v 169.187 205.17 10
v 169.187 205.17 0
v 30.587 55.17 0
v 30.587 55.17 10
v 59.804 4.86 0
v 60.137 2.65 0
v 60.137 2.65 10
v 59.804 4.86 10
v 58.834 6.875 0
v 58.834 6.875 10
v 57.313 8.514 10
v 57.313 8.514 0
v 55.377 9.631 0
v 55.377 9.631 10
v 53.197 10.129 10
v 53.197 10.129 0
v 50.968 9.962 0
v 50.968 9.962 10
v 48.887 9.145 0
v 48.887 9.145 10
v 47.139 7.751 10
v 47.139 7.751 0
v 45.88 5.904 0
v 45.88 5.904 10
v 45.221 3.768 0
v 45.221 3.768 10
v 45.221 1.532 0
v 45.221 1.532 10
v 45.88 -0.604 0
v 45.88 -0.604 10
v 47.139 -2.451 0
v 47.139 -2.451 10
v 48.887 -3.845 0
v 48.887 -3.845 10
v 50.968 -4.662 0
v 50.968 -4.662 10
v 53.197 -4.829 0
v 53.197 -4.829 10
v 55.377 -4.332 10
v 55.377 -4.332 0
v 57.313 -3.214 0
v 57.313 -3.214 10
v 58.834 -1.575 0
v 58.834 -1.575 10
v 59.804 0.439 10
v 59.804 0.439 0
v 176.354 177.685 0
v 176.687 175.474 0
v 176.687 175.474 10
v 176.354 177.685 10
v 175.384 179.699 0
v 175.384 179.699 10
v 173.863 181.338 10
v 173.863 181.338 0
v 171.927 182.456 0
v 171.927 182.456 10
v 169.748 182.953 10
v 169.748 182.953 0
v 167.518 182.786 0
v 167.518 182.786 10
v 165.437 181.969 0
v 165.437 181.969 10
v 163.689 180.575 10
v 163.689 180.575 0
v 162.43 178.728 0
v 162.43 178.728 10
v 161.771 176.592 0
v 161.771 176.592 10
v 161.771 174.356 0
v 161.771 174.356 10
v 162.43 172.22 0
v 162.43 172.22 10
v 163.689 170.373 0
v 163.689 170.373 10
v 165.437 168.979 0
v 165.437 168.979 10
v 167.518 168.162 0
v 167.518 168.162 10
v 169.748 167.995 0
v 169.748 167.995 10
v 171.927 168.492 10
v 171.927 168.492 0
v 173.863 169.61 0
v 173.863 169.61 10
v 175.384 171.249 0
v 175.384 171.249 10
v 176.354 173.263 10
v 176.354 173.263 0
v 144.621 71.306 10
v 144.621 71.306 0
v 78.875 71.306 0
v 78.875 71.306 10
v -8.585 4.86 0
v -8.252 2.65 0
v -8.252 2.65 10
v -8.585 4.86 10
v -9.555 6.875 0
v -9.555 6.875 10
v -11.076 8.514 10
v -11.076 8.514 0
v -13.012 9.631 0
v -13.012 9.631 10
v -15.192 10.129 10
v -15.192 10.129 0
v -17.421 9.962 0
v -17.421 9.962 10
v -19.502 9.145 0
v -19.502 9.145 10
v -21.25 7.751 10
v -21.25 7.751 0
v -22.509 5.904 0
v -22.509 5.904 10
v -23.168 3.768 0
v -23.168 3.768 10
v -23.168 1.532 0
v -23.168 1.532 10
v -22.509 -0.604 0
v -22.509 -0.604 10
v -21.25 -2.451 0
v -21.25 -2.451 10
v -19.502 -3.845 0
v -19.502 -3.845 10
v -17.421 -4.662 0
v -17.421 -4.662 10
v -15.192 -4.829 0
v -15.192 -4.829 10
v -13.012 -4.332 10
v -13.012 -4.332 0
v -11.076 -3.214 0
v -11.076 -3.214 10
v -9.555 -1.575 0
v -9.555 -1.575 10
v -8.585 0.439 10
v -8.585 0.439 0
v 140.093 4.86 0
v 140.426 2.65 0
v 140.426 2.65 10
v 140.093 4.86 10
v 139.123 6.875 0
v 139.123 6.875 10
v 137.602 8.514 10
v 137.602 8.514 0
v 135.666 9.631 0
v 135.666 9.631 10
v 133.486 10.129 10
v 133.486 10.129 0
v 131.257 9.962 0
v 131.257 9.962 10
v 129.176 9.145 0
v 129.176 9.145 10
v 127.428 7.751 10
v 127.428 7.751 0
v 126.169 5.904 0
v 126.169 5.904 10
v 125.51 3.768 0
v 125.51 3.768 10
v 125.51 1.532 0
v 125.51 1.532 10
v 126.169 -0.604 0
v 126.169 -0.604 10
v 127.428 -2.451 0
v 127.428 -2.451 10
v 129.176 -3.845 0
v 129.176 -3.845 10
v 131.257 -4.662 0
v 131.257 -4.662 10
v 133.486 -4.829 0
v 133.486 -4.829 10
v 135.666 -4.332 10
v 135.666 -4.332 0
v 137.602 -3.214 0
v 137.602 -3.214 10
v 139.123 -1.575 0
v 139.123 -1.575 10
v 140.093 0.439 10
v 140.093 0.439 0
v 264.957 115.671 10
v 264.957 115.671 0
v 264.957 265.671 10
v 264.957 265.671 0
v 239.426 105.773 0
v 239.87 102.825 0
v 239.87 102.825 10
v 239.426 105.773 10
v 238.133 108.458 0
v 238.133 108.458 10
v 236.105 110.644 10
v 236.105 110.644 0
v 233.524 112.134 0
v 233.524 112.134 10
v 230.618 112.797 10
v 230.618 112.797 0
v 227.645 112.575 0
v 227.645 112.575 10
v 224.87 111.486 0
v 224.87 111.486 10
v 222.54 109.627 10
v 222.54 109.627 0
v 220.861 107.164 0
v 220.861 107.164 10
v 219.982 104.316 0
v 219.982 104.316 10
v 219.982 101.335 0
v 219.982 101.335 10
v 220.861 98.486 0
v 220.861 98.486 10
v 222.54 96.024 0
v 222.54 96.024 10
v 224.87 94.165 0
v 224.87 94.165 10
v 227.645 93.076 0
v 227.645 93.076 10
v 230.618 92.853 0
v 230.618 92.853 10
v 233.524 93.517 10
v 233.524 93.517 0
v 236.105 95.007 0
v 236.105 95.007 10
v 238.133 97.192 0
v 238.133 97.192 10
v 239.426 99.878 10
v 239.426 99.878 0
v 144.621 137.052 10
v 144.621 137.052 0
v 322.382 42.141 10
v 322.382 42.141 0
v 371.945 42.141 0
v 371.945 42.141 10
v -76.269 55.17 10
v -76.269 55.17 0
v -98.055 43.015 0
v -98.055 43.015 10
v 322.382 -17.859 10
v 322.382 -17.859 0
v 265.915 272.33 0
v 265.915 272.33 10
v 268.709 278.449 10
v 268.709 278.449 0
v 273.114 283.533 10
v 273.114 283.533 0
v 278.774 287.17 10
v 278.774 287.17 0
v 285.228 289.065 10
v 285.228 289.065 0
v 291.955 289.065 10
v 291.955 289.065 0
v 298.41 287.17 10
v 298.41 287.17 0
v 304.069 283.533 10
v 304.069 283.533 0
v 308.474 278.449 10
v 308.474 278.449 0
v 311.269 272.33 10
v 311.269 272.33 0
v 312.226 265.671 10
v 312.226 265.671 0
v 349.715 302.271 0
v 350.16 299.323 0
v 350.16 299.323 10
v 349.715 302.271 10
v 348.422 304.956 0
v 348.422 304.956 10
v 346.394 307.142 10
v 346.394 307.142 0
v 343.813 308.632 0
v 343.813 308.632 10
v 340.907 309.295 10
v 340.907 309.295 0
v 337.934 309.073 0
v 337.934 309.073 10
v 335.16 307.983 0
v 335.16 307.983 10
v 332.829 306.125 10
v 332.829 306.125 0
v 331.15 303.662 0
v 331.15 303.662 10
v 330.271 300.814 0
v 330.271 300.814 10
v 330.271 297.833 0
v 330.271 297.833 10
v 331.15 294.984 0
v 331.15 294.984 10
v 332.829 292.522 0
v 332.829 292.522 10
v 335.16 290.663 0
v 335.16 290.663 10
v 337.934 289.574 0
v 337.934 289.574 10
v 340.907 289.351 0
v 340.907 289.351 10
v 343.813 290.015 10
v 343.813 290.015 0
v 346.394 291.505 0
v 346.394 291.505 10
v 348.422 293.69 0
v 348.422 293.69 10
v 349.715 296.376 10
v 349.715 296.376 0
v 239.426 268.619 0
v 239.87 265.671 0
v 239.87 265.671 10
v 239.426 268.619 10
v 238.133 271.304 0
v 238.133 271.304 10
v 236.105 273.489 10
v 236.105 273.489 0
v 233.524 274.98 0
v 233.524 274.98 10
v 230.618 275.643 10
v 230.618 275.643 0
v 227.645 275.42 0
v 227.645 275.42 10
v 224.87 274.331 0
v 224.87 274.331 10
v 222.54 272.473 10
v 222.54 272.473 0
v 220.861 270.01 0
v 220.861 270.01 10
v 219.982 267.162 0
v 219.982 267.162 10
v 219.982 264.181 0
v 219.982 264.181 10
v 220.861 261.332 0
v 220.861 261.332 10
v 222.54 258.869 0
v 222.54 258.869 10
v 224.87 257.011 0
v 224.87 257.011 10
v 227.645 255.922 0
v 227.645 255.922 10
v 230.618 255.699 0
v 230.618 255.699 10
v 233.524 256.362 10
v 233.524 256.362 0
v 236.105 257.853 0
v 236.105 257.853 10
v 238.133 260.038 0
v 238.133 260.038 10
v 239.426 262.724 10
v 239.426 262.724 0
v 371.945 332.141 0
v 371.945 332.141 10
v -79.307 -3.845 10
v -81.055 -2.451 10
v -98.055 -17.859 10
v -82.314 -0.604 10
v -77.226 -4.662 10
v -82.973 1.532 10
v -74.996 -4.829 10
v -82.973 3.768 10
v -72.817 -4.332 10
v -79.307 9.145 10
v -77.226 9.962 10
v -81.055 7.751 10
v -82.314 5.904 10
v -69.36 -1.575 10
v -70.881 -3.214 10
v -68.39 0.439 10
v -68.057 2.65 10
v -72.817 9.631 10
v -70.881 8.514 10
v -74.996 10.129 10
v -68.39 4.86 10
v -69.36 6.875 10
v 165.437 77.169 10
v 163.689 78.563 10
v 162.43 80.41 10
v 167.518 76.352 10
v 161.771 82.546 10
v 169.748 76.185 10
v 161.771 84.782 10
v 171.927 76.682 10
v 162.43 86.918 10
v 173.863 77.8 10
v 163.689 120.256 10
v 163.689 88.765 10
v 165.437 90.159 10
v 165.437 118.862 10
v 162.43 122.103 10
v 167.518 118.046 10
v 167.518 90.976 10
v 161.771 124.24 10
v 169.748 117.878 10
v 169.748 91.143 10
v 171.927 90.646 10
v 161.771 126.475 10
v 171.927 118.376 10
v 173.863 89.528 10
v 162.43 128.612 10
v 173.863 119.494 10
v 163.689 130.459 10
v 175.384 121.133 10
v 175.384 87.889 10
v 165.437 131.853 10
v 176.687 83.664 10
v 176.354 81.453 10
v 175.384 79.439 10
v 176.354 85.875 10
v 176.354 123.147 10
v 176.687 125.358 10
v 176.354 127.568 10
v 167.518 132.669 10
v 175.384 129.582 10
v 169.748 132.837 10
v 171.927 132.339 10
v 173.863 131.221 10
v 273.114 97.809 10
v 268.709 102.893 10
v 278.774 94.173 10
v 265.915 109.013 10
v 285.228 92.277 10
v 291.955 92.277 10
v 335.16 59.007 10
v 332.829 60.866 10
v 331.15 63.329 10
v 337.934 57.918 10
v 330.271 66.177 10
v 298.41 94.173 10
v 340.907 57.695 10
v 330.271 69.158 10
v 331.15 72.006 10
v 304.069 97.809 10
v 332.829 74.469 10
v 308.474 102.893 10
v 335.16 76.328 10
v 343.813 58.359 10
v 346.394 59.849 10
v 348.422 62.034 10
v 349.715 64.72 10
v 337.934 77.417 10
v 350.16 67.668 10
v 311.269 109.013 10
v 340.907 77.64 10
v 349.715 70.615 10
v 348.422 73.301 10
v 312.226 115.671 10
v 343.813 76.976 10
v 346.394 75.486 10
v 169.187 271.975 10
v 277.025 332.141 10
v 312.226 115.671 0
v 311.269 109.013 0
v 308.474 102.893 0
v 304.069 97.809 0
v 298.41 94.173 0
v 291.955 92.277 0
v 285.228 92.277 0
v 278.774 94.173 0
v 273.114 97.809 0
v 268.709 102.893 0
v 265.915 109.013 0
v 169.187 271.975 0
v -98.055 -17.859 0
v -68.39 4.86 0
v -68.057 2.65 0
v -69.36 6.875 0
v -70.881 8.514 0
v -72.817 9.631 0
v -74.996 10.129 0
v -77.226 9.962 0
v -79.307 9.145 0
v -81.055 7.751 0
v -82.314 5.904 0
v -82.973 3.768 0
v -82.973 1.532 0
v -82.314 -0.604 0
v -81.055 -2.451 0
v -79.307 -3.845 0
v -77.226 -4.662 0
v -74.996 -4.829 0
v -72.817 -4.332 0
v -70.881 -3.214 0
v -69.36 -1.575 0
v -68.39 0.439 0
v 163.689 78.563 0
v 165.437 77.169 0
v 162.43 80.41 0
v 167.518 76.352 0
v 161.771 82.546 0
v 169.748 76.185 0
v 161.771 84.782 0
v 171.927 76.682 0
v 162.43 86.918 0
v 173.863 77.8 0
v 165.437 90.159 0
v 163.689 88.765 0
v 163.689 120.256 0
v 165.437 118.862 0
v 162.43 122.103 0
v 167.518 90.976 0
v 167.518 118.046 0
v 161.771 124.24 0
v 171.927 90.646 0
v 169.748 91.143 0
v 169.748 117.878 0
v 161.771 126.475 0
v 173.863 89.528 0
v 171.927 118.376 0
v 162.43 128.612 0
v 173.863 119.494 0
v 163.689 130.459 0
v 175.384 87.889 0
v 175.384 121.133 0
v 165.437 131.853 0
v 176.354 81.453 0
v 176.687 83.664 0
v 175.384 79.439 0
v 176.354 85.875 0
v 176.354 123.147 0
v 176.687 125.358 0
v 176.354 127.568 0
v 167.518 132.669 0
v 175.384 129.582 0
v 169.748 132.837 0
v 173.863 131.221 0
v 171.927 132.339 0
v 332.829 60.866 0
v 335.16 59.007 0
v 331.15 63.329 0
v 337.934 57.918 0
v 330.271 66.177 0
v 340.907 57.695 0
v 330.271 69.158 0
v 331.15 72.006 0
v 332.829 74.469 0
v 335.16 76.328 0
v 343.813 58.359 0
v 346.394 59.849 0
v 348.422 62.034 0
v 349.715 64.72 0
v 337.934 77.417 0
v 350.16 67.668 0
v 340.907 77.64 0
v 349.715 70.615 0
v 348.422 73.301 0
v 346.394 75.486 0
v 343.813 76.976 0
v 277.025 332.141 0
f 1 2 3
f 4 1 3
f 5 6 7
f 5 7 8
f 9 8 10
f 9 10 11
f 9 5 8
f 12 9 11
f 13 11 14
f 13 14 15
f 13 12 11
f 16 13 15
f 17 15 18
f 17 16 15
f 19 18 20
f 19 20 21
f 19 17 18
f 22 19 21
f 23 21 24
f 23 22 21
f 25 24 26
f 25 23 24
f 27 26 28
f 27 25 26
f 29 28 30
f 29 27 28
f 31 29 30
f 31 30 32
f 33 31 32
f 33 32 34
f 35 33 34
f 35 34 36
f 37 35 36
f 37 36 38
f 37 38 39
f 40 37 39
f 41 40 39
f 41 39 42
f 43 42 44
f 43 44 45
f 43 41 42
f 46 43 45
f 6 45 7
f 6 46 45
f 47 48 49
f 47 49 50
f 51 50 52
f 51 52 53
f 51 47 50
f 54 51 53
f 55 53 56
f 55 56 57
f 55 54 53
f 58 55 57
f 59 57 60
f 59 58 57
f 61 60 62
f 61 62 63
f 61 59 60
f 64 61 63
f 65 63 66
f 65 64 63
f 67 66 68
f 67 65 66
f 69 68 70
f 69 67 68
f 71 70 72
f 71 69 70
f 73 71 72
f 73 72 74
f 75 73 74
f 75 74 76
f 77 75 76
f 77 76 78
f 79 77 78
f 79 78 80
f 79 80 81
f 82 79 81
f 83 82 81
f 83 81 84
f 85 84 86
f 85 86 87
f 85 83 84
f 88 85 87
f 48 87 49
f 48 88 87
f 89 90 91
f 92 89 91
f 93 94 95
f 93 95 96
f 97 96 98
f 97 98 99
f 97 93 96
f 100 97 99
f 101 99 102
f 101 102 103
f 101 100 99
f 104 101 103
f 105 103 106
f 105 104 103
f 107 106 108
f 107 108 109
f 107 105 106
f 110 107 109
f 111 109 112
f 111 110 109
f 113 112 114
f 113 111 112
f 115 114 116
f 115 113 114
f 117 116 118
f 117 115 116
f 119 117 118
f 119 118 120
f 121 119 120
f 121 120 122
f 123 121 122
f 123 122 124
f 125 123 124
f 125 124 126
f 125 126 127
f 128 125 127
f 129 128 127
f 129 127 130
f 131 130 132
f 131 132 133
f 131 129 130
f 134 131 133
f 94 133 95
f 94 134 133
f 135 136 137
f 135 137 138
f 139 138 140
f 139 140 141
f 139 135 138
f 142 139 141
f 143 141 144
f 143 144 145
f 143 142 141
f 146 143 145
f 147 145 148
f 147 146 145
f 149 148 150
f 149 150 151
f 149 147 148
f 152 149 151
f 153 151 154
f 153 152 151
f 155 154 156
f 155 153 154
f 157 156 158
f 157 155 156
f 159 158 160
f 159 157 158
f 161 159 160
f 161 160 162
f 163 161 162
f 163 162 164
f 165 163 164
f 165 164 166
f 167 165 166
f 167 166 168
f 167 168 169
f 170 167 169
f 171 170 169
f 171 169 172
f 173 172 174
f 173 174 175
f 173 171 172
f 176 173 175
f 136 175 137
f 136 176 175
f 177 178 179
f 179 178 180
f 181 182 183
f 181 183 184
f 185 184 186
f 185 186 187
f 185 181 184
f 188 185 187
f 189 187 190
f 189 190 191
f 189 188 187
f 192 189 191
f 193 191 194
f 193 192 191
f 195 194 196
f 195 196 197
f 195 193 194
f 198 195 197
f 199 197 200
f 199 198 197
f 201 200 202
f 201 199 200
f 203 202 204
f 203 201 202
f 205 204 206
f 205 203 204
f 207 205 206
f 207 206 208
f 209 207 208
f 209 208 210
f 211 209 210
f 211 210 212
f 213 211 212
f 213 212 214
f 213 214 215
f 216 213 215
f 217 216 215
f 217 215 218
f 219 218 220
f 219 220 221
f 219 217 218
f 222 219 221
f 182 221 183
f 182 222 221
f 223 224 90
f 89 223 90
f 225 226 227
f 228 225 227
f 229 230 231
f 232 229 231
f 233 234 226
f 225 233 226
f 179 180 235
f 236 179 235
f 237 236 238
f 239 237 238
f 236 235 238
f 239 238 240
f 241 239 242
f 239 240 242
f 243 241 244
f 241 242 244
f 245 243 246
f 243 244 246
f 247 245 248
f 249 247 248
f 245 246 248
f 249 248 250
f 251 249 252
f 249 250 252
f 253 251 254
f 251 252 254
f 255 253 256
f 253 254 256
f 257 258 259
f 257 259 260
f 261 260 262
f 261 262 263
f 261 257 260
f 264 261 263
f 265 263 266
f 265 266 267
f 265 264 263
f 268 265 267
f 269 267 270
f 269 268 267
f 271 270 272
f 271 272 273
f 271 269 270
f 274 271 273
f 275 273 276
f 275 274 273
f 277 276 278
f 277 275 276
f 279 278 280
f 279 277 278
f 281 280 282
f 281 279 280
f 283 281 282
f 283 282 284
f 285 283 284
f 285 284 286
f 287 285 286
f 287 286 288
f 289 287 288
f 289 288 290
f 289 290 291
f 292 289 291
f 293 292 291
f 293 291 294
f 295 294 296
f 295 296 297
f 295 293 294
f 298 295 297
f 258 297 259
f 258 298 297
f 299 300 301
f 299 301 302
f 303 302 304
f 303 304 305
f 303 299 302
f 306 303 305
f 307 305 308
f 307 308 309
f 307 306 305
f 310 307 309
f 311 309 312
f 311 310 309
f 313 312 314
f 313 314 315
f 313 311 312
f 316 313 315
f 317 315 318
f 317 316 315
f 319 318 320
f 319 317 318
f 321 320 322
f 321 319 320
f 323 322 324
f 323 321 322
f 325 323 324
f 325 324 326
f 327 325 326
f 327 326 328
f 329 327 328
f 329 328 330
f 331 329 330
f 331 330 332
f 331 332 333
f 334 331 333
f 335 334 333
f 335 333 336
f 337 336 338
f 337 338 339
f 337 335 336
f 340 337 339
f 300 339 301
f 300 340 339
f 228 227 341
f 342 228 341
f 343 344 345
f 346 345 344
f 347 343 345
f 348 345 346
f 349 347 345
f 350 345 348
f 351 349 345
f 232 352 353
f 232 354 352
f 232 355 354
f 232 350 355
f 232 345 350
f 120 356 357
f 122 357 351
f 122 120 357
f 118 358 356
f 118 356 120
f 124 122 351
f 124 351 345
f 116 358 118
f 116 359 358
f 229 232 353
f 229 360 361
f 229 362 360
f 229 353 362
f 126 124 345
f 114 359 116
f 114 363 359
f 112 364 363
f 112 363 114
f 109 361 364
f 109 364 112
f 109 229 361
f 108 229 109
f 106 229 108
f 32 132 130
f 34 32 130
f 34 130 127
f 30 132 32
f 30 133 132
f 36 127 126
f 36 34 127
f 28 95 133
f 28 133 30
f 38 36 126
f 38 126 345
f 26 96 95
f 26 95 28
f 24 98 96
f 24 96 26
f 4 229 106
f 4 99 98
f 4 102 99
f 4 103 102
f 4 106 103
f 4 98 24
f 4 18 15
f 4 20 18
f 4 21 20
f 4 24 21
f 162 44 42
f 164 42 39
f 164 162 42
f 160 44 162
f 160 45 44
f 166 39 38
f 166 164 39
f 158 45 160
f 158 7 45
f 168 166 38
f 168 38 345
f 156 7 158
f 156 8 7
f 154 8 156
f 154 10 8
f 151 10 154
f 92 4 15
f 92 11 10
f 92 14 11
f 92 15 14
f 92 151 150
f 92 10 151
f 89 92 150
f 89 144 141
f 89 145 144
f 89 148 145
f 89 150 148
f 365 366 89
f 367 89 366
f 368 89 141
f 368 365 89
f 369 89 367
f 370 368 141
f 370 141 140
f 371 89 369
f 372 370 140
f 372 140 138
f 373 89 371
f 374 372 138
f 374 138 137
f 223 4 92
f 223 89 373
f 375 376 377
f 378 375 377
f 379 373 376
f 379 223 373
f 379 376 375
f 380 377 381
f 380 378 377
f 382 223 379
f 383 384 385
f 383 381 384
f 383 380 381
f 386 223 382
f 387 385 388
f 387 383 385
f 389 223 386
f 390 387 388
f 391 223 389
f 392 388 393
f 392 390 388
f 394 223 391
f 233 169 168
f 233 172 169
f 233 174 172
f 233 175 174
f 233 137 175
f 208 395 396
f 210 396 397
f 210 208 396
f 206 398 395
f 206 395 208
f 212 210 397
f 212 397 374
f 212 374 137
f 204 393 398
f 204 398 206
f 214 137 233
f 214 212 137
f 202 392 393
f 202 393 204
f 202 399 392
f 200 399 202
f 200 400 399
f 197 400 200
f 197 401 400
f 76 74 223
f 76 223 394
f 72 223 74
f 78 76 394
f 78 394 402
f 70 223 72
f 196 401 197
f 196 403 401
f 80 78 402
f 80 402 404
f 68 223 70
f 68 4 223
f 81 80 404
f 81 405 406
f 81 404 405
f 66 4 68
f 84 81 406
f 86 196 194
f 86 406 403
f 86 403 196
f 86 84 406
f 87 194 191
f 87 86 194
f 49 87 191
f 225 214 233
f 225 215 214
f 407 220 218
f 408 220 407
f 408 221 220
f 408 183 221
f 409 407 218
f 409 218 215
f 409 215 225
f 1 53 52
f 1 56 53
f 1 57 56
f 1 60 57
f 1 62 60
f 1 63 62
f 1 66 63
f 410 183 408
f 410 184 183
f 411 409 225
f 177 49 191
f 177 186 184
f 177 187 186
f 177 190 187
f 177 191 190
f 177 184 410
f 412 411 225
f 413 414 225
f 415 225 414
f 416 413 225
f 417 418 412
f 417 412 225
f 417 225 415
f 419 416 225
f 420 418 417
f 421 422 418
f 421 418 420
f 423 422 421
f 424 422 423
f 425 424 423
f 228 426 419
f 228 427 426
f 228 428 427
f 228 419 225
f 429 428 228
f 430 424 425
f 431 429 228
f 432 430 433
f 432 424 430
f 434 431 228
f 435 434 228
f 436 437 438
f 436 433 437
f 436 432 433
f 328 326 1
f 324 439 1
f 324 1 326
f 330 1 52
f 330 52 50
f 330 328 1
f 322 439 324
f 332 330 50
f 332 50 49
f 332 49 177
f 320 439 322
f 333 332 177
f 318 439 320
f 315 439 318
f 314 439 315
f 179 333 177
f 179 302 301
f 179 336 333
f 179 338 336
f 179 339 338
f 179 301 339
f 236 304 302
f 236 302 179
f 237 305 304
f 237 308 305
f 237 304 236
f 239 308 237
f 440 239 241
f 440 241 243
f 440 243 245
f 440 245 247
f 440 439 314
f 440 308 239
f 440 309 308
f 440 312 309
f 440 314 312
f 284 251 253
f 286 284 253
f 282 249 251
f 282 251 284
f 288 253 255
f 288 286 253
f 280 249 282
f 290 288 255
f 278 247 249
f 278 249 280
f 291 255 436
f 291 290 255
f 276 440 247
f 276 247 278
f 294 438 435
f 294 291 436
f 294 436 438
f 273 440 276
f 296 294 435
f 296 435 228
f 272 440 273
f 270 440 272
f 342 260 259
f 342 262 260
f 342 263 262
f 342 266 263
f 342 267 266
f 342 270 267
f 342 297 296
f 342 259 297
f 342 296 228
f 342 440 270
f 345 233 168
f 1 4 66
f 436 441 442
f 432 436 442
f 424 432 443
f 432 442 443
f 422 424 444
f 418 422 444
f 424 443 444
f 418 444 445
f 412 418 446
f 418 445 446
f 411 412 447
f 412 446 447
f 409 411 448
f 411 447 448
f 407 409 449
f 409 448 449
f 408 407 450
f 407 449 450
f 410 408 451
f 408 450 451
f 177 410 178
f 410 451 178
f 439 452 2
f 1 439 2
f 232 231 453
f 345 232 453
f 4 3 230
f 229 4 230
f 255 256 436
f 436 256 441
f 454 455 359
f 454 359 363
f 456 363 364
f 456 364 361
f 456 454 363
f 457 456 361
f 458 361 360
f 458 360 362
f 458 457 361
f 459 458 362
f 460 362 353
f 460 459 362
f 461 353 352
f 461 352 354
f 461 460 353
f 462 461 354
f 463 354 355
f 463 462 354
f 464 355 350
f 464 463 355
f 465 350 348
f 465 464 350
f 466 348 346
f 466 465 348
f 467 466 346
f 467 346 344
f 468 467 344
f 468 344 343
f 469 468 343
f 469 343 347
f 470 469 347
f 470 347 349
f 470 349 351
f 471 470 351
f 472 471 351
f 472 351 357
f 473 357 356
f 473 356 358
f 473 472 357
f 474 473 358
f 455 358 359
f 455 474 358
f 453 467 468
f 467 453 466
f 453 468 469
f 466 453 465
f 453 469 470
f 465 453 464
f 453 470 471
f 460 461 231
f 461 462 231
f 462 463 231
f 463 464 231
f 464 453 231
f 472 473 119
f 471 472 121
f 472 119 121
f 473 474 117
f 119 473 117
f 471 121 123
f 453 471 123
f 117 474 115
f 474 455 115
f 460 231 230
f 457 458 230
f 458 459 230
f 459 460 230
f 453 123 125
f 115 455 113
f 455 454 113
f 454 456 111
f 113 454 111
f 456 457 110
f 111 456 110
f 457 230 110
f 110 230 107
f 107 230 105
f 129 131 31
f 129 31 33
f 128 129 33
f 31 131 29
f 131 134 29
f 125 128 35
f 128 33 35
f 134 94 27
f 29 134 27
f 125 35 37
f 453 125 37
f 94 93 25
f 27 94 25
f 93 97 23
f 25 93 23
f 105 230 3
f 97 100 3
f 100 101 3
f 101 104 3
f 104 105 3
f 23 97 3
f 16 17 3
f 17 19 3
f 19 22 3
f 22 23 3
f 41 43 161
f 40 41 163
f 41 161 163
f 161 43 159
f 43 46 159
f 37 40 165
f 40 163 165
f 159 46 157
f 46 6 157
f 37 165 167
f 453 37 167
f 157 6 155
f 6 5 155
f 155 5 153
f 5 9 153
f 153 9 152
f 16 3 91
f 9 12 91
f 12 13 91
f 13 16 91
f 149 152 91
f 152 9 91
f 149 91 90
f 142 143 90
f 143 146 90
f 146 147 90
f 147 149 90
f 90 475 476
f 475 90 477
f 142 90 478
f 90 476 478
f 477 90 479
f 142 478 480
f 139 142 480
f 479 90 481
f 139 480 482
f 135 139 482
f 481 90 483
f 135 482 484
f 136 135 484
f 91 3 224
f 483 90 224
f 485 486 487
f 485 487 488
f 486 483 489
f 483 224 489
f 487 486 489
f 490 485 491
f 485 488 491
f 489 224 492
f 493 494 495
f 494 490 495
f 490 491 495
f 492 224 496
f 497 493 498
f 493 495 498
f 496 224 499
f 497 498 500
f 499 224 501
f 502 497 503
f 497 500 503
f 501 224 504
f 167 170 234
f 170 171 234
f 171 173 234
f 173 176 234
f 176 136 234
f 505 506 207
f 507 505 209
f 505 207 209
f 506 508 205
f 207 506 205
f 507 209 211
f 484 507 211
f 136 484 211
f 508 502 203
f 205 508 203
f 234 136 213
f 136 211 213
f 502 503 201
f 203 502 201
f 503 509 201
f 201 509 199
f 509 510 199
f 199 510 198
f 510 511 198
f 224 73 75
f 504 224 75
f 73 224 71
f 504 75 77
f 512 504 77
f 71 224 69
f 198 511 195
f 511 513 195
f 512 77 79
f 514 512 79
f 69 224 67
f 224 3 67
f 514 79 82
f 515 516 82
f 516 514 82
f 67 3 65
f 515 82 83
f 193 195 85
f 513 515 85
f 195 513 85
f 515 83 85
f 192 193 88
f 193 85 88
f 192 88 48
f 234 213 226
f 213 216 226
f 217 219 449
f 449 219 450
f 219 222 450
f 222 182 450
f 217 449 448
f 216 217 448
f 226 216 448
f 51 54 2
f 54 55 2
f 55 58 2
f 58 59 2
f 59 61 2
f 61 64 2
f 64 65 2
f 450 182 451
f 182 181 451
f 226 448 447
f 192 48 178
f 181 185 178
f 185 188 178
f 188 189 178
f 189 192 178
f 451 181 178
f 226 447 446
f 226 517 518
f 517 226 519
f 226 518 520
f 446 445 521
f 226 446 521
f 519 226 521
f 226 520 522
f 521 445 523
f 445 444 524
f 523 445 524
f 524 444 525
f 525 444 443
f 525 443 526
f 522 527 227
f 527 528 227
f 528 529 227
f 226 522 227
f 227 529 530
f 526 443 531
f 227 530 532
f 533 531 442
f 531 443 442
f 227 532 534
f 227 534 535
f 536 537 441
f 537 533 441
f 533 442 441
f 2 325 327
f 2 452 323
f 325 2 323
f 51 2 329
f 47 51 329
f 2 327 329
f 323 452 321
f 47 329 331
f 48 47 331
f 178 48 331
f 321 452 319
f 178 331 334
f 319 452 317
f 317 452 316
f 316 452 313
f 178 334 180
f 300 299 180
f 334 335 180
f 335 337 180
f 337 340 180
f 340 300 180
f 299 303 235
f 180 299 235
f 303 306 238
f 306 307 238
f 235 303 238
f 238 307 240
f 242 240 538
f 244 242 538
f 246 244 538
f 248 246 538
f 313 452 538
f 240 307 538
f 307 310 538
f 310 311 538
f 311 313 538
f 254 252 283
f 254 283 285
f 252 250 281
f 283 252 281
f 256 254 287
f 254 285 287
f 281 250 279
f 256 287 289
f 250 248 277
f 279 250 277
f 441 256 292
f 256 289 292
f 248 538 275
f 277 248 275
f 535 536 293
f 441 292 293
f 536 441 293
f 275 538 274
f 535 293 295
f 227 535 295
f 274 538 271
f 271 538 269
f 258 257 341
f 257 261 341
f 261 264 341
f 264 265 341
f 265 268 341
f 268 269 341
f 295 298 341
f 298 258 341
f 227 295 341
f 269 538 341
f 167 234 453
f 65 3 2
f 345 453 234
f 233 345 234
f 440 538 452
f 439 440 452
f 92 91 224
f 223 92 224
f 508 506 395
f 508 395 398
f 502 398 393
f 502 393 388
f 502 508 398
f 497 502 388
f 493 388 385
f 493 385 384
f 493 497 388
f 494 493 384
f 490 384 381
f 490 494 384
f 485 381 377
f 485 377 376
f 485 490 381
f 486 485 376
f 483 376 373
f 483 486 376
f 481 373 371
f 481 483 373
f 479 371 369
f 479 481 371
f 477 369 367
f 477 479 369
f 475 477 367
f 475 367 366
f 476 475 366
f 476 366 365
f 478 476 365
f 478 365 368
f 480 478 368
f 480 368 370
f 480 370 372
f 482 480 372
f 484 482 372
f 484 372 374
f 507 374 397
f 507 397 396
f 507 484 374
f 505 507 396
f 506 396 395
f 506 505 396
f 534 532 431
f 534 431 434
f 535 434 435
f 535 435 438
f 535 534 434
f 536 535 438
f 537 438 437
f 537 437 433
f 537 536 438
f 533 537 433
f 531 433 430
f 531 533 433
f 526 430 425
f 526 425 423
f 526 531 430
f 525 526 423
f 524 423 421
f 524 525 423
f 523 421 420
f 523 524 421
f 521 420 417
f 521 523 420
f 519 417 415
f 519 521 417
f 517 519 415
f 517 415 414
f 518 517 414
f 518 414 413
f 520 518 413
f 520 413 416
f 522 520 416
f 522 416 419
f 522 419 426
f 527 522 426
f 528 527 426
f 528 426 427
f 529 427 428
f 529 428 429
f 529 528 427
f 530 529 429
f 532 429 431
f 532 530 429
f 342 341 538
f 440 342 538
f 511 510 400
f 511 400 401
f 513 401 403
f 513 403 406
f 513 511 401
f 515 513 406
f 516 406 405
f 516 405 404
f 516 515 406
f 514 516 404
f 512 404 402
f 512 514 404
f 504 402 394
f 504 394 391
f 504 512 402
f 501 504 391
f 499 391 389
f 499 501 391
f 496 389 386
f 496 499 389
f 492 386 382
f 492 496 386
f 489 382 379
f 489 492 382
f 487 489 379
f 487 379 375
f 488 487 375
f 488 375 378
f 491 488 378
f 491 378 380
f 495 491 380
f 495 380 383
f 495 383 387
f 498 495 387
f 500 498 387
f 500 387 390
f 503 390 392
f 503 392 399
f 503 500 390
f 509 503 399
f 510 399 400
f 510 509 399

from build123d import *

# Parameters (mm, degrees)
SKETCH1_R           = 7.5
SKETCH1_R_2         = 10
BOSS_EXTRUDE1_DEPTH = 10


with BuildPart() as part:
    # Sketch1 → Boss-Extrude1 (new body)
    with BuildSketch(Plane.XY):
        Polygon((-98.05511991, -17.859318996), (322.382476836, -17.859318996), (322.382476836, 42.140681004), (371.94488009, 42.140681004), (371.94488009, 332.140681004), (277.025034275, 332.140681004), (169.187054595, 271.975052979), (169.187054595, 205.170044114), (30.5872252, 55.170044114), (-76.268588622, 55.170044114), (-98.05511991, 43.014768752), align=None)
        with Locations((-15.752224544, 2.649813362)):
            Circle(SKETCH1_R, mode=Mode.SUBTRACT)
        with Locations((-75.556801399, 2.649813362)):
            Circle(SKETCH1_R, mode=Mode.SUBTRACT)
        with Locations((52.636779721, 2.649813362)):
            Circle(SKETCH1_R, mode=Mode.SUBTRACT)
        with Locations((132.925934878, 2.649813362)):
            Circle(SKETCH1_R, mode=Mode.SUBTRACT)
        with Locations((169.187054595, 83.663978495)):
            Circle(SKETCH1_R, mode=Mode.SUBTRACT)
        with Locations((169.187054595, 125.357526882)):
            Circle(SKETCH1_R, mode=Mode.SUBTRACT)
        with Locations((169.187054595, 175.474014337)):
            Circle(SKETCH1_R, mode=Mode.SUBTRACT)
        with Locations((229.870255563, 265.671146953)):
            Circle(SKETCH1_R_2, mode=Mode.SUBTRACT)
        with Locations((229.870255563, 102.825256229)):
            Circle(SKETCH1_R_2, mode=Mode.SUBTRACT)
        with Locations((340.159565259, 299.323240315)):
            Circle(SKETCH1_R_2, mode=Mode.SUBTRACT)
        with Locations((340.159565259, 67.667528684)):
            Circle(SKETCH1_R_2, mode=Mode.SUBTRACT)
        with BuildLine():
            Line((312.226028305, 265.671146953), (312.226028305, 115.671146953))
            ThreePointArc((312.226028305, 115.671146953), (288.591642629, 92.036761277), (264.957256952, 115.671146953))
            Line((264.957256952, 115.671146953), (264.957256952, 265.671146953))
            ThreePointArc((264.957256952, 265.671146953), (288.591642629, 289.30553263), (312.226028305, 265.671146953))
        make_face(mode=Mode.SUBTRACT)
        Polygon((78.874891909, 71.306483913), (144.620819019, 137.052411023), (144.620819019, 71.306483913), align=None, mode=Mode.SUBTRACT)
    extrude(amount=BOSS_EXTRUDE1_DEPTH)


solid = part.part
